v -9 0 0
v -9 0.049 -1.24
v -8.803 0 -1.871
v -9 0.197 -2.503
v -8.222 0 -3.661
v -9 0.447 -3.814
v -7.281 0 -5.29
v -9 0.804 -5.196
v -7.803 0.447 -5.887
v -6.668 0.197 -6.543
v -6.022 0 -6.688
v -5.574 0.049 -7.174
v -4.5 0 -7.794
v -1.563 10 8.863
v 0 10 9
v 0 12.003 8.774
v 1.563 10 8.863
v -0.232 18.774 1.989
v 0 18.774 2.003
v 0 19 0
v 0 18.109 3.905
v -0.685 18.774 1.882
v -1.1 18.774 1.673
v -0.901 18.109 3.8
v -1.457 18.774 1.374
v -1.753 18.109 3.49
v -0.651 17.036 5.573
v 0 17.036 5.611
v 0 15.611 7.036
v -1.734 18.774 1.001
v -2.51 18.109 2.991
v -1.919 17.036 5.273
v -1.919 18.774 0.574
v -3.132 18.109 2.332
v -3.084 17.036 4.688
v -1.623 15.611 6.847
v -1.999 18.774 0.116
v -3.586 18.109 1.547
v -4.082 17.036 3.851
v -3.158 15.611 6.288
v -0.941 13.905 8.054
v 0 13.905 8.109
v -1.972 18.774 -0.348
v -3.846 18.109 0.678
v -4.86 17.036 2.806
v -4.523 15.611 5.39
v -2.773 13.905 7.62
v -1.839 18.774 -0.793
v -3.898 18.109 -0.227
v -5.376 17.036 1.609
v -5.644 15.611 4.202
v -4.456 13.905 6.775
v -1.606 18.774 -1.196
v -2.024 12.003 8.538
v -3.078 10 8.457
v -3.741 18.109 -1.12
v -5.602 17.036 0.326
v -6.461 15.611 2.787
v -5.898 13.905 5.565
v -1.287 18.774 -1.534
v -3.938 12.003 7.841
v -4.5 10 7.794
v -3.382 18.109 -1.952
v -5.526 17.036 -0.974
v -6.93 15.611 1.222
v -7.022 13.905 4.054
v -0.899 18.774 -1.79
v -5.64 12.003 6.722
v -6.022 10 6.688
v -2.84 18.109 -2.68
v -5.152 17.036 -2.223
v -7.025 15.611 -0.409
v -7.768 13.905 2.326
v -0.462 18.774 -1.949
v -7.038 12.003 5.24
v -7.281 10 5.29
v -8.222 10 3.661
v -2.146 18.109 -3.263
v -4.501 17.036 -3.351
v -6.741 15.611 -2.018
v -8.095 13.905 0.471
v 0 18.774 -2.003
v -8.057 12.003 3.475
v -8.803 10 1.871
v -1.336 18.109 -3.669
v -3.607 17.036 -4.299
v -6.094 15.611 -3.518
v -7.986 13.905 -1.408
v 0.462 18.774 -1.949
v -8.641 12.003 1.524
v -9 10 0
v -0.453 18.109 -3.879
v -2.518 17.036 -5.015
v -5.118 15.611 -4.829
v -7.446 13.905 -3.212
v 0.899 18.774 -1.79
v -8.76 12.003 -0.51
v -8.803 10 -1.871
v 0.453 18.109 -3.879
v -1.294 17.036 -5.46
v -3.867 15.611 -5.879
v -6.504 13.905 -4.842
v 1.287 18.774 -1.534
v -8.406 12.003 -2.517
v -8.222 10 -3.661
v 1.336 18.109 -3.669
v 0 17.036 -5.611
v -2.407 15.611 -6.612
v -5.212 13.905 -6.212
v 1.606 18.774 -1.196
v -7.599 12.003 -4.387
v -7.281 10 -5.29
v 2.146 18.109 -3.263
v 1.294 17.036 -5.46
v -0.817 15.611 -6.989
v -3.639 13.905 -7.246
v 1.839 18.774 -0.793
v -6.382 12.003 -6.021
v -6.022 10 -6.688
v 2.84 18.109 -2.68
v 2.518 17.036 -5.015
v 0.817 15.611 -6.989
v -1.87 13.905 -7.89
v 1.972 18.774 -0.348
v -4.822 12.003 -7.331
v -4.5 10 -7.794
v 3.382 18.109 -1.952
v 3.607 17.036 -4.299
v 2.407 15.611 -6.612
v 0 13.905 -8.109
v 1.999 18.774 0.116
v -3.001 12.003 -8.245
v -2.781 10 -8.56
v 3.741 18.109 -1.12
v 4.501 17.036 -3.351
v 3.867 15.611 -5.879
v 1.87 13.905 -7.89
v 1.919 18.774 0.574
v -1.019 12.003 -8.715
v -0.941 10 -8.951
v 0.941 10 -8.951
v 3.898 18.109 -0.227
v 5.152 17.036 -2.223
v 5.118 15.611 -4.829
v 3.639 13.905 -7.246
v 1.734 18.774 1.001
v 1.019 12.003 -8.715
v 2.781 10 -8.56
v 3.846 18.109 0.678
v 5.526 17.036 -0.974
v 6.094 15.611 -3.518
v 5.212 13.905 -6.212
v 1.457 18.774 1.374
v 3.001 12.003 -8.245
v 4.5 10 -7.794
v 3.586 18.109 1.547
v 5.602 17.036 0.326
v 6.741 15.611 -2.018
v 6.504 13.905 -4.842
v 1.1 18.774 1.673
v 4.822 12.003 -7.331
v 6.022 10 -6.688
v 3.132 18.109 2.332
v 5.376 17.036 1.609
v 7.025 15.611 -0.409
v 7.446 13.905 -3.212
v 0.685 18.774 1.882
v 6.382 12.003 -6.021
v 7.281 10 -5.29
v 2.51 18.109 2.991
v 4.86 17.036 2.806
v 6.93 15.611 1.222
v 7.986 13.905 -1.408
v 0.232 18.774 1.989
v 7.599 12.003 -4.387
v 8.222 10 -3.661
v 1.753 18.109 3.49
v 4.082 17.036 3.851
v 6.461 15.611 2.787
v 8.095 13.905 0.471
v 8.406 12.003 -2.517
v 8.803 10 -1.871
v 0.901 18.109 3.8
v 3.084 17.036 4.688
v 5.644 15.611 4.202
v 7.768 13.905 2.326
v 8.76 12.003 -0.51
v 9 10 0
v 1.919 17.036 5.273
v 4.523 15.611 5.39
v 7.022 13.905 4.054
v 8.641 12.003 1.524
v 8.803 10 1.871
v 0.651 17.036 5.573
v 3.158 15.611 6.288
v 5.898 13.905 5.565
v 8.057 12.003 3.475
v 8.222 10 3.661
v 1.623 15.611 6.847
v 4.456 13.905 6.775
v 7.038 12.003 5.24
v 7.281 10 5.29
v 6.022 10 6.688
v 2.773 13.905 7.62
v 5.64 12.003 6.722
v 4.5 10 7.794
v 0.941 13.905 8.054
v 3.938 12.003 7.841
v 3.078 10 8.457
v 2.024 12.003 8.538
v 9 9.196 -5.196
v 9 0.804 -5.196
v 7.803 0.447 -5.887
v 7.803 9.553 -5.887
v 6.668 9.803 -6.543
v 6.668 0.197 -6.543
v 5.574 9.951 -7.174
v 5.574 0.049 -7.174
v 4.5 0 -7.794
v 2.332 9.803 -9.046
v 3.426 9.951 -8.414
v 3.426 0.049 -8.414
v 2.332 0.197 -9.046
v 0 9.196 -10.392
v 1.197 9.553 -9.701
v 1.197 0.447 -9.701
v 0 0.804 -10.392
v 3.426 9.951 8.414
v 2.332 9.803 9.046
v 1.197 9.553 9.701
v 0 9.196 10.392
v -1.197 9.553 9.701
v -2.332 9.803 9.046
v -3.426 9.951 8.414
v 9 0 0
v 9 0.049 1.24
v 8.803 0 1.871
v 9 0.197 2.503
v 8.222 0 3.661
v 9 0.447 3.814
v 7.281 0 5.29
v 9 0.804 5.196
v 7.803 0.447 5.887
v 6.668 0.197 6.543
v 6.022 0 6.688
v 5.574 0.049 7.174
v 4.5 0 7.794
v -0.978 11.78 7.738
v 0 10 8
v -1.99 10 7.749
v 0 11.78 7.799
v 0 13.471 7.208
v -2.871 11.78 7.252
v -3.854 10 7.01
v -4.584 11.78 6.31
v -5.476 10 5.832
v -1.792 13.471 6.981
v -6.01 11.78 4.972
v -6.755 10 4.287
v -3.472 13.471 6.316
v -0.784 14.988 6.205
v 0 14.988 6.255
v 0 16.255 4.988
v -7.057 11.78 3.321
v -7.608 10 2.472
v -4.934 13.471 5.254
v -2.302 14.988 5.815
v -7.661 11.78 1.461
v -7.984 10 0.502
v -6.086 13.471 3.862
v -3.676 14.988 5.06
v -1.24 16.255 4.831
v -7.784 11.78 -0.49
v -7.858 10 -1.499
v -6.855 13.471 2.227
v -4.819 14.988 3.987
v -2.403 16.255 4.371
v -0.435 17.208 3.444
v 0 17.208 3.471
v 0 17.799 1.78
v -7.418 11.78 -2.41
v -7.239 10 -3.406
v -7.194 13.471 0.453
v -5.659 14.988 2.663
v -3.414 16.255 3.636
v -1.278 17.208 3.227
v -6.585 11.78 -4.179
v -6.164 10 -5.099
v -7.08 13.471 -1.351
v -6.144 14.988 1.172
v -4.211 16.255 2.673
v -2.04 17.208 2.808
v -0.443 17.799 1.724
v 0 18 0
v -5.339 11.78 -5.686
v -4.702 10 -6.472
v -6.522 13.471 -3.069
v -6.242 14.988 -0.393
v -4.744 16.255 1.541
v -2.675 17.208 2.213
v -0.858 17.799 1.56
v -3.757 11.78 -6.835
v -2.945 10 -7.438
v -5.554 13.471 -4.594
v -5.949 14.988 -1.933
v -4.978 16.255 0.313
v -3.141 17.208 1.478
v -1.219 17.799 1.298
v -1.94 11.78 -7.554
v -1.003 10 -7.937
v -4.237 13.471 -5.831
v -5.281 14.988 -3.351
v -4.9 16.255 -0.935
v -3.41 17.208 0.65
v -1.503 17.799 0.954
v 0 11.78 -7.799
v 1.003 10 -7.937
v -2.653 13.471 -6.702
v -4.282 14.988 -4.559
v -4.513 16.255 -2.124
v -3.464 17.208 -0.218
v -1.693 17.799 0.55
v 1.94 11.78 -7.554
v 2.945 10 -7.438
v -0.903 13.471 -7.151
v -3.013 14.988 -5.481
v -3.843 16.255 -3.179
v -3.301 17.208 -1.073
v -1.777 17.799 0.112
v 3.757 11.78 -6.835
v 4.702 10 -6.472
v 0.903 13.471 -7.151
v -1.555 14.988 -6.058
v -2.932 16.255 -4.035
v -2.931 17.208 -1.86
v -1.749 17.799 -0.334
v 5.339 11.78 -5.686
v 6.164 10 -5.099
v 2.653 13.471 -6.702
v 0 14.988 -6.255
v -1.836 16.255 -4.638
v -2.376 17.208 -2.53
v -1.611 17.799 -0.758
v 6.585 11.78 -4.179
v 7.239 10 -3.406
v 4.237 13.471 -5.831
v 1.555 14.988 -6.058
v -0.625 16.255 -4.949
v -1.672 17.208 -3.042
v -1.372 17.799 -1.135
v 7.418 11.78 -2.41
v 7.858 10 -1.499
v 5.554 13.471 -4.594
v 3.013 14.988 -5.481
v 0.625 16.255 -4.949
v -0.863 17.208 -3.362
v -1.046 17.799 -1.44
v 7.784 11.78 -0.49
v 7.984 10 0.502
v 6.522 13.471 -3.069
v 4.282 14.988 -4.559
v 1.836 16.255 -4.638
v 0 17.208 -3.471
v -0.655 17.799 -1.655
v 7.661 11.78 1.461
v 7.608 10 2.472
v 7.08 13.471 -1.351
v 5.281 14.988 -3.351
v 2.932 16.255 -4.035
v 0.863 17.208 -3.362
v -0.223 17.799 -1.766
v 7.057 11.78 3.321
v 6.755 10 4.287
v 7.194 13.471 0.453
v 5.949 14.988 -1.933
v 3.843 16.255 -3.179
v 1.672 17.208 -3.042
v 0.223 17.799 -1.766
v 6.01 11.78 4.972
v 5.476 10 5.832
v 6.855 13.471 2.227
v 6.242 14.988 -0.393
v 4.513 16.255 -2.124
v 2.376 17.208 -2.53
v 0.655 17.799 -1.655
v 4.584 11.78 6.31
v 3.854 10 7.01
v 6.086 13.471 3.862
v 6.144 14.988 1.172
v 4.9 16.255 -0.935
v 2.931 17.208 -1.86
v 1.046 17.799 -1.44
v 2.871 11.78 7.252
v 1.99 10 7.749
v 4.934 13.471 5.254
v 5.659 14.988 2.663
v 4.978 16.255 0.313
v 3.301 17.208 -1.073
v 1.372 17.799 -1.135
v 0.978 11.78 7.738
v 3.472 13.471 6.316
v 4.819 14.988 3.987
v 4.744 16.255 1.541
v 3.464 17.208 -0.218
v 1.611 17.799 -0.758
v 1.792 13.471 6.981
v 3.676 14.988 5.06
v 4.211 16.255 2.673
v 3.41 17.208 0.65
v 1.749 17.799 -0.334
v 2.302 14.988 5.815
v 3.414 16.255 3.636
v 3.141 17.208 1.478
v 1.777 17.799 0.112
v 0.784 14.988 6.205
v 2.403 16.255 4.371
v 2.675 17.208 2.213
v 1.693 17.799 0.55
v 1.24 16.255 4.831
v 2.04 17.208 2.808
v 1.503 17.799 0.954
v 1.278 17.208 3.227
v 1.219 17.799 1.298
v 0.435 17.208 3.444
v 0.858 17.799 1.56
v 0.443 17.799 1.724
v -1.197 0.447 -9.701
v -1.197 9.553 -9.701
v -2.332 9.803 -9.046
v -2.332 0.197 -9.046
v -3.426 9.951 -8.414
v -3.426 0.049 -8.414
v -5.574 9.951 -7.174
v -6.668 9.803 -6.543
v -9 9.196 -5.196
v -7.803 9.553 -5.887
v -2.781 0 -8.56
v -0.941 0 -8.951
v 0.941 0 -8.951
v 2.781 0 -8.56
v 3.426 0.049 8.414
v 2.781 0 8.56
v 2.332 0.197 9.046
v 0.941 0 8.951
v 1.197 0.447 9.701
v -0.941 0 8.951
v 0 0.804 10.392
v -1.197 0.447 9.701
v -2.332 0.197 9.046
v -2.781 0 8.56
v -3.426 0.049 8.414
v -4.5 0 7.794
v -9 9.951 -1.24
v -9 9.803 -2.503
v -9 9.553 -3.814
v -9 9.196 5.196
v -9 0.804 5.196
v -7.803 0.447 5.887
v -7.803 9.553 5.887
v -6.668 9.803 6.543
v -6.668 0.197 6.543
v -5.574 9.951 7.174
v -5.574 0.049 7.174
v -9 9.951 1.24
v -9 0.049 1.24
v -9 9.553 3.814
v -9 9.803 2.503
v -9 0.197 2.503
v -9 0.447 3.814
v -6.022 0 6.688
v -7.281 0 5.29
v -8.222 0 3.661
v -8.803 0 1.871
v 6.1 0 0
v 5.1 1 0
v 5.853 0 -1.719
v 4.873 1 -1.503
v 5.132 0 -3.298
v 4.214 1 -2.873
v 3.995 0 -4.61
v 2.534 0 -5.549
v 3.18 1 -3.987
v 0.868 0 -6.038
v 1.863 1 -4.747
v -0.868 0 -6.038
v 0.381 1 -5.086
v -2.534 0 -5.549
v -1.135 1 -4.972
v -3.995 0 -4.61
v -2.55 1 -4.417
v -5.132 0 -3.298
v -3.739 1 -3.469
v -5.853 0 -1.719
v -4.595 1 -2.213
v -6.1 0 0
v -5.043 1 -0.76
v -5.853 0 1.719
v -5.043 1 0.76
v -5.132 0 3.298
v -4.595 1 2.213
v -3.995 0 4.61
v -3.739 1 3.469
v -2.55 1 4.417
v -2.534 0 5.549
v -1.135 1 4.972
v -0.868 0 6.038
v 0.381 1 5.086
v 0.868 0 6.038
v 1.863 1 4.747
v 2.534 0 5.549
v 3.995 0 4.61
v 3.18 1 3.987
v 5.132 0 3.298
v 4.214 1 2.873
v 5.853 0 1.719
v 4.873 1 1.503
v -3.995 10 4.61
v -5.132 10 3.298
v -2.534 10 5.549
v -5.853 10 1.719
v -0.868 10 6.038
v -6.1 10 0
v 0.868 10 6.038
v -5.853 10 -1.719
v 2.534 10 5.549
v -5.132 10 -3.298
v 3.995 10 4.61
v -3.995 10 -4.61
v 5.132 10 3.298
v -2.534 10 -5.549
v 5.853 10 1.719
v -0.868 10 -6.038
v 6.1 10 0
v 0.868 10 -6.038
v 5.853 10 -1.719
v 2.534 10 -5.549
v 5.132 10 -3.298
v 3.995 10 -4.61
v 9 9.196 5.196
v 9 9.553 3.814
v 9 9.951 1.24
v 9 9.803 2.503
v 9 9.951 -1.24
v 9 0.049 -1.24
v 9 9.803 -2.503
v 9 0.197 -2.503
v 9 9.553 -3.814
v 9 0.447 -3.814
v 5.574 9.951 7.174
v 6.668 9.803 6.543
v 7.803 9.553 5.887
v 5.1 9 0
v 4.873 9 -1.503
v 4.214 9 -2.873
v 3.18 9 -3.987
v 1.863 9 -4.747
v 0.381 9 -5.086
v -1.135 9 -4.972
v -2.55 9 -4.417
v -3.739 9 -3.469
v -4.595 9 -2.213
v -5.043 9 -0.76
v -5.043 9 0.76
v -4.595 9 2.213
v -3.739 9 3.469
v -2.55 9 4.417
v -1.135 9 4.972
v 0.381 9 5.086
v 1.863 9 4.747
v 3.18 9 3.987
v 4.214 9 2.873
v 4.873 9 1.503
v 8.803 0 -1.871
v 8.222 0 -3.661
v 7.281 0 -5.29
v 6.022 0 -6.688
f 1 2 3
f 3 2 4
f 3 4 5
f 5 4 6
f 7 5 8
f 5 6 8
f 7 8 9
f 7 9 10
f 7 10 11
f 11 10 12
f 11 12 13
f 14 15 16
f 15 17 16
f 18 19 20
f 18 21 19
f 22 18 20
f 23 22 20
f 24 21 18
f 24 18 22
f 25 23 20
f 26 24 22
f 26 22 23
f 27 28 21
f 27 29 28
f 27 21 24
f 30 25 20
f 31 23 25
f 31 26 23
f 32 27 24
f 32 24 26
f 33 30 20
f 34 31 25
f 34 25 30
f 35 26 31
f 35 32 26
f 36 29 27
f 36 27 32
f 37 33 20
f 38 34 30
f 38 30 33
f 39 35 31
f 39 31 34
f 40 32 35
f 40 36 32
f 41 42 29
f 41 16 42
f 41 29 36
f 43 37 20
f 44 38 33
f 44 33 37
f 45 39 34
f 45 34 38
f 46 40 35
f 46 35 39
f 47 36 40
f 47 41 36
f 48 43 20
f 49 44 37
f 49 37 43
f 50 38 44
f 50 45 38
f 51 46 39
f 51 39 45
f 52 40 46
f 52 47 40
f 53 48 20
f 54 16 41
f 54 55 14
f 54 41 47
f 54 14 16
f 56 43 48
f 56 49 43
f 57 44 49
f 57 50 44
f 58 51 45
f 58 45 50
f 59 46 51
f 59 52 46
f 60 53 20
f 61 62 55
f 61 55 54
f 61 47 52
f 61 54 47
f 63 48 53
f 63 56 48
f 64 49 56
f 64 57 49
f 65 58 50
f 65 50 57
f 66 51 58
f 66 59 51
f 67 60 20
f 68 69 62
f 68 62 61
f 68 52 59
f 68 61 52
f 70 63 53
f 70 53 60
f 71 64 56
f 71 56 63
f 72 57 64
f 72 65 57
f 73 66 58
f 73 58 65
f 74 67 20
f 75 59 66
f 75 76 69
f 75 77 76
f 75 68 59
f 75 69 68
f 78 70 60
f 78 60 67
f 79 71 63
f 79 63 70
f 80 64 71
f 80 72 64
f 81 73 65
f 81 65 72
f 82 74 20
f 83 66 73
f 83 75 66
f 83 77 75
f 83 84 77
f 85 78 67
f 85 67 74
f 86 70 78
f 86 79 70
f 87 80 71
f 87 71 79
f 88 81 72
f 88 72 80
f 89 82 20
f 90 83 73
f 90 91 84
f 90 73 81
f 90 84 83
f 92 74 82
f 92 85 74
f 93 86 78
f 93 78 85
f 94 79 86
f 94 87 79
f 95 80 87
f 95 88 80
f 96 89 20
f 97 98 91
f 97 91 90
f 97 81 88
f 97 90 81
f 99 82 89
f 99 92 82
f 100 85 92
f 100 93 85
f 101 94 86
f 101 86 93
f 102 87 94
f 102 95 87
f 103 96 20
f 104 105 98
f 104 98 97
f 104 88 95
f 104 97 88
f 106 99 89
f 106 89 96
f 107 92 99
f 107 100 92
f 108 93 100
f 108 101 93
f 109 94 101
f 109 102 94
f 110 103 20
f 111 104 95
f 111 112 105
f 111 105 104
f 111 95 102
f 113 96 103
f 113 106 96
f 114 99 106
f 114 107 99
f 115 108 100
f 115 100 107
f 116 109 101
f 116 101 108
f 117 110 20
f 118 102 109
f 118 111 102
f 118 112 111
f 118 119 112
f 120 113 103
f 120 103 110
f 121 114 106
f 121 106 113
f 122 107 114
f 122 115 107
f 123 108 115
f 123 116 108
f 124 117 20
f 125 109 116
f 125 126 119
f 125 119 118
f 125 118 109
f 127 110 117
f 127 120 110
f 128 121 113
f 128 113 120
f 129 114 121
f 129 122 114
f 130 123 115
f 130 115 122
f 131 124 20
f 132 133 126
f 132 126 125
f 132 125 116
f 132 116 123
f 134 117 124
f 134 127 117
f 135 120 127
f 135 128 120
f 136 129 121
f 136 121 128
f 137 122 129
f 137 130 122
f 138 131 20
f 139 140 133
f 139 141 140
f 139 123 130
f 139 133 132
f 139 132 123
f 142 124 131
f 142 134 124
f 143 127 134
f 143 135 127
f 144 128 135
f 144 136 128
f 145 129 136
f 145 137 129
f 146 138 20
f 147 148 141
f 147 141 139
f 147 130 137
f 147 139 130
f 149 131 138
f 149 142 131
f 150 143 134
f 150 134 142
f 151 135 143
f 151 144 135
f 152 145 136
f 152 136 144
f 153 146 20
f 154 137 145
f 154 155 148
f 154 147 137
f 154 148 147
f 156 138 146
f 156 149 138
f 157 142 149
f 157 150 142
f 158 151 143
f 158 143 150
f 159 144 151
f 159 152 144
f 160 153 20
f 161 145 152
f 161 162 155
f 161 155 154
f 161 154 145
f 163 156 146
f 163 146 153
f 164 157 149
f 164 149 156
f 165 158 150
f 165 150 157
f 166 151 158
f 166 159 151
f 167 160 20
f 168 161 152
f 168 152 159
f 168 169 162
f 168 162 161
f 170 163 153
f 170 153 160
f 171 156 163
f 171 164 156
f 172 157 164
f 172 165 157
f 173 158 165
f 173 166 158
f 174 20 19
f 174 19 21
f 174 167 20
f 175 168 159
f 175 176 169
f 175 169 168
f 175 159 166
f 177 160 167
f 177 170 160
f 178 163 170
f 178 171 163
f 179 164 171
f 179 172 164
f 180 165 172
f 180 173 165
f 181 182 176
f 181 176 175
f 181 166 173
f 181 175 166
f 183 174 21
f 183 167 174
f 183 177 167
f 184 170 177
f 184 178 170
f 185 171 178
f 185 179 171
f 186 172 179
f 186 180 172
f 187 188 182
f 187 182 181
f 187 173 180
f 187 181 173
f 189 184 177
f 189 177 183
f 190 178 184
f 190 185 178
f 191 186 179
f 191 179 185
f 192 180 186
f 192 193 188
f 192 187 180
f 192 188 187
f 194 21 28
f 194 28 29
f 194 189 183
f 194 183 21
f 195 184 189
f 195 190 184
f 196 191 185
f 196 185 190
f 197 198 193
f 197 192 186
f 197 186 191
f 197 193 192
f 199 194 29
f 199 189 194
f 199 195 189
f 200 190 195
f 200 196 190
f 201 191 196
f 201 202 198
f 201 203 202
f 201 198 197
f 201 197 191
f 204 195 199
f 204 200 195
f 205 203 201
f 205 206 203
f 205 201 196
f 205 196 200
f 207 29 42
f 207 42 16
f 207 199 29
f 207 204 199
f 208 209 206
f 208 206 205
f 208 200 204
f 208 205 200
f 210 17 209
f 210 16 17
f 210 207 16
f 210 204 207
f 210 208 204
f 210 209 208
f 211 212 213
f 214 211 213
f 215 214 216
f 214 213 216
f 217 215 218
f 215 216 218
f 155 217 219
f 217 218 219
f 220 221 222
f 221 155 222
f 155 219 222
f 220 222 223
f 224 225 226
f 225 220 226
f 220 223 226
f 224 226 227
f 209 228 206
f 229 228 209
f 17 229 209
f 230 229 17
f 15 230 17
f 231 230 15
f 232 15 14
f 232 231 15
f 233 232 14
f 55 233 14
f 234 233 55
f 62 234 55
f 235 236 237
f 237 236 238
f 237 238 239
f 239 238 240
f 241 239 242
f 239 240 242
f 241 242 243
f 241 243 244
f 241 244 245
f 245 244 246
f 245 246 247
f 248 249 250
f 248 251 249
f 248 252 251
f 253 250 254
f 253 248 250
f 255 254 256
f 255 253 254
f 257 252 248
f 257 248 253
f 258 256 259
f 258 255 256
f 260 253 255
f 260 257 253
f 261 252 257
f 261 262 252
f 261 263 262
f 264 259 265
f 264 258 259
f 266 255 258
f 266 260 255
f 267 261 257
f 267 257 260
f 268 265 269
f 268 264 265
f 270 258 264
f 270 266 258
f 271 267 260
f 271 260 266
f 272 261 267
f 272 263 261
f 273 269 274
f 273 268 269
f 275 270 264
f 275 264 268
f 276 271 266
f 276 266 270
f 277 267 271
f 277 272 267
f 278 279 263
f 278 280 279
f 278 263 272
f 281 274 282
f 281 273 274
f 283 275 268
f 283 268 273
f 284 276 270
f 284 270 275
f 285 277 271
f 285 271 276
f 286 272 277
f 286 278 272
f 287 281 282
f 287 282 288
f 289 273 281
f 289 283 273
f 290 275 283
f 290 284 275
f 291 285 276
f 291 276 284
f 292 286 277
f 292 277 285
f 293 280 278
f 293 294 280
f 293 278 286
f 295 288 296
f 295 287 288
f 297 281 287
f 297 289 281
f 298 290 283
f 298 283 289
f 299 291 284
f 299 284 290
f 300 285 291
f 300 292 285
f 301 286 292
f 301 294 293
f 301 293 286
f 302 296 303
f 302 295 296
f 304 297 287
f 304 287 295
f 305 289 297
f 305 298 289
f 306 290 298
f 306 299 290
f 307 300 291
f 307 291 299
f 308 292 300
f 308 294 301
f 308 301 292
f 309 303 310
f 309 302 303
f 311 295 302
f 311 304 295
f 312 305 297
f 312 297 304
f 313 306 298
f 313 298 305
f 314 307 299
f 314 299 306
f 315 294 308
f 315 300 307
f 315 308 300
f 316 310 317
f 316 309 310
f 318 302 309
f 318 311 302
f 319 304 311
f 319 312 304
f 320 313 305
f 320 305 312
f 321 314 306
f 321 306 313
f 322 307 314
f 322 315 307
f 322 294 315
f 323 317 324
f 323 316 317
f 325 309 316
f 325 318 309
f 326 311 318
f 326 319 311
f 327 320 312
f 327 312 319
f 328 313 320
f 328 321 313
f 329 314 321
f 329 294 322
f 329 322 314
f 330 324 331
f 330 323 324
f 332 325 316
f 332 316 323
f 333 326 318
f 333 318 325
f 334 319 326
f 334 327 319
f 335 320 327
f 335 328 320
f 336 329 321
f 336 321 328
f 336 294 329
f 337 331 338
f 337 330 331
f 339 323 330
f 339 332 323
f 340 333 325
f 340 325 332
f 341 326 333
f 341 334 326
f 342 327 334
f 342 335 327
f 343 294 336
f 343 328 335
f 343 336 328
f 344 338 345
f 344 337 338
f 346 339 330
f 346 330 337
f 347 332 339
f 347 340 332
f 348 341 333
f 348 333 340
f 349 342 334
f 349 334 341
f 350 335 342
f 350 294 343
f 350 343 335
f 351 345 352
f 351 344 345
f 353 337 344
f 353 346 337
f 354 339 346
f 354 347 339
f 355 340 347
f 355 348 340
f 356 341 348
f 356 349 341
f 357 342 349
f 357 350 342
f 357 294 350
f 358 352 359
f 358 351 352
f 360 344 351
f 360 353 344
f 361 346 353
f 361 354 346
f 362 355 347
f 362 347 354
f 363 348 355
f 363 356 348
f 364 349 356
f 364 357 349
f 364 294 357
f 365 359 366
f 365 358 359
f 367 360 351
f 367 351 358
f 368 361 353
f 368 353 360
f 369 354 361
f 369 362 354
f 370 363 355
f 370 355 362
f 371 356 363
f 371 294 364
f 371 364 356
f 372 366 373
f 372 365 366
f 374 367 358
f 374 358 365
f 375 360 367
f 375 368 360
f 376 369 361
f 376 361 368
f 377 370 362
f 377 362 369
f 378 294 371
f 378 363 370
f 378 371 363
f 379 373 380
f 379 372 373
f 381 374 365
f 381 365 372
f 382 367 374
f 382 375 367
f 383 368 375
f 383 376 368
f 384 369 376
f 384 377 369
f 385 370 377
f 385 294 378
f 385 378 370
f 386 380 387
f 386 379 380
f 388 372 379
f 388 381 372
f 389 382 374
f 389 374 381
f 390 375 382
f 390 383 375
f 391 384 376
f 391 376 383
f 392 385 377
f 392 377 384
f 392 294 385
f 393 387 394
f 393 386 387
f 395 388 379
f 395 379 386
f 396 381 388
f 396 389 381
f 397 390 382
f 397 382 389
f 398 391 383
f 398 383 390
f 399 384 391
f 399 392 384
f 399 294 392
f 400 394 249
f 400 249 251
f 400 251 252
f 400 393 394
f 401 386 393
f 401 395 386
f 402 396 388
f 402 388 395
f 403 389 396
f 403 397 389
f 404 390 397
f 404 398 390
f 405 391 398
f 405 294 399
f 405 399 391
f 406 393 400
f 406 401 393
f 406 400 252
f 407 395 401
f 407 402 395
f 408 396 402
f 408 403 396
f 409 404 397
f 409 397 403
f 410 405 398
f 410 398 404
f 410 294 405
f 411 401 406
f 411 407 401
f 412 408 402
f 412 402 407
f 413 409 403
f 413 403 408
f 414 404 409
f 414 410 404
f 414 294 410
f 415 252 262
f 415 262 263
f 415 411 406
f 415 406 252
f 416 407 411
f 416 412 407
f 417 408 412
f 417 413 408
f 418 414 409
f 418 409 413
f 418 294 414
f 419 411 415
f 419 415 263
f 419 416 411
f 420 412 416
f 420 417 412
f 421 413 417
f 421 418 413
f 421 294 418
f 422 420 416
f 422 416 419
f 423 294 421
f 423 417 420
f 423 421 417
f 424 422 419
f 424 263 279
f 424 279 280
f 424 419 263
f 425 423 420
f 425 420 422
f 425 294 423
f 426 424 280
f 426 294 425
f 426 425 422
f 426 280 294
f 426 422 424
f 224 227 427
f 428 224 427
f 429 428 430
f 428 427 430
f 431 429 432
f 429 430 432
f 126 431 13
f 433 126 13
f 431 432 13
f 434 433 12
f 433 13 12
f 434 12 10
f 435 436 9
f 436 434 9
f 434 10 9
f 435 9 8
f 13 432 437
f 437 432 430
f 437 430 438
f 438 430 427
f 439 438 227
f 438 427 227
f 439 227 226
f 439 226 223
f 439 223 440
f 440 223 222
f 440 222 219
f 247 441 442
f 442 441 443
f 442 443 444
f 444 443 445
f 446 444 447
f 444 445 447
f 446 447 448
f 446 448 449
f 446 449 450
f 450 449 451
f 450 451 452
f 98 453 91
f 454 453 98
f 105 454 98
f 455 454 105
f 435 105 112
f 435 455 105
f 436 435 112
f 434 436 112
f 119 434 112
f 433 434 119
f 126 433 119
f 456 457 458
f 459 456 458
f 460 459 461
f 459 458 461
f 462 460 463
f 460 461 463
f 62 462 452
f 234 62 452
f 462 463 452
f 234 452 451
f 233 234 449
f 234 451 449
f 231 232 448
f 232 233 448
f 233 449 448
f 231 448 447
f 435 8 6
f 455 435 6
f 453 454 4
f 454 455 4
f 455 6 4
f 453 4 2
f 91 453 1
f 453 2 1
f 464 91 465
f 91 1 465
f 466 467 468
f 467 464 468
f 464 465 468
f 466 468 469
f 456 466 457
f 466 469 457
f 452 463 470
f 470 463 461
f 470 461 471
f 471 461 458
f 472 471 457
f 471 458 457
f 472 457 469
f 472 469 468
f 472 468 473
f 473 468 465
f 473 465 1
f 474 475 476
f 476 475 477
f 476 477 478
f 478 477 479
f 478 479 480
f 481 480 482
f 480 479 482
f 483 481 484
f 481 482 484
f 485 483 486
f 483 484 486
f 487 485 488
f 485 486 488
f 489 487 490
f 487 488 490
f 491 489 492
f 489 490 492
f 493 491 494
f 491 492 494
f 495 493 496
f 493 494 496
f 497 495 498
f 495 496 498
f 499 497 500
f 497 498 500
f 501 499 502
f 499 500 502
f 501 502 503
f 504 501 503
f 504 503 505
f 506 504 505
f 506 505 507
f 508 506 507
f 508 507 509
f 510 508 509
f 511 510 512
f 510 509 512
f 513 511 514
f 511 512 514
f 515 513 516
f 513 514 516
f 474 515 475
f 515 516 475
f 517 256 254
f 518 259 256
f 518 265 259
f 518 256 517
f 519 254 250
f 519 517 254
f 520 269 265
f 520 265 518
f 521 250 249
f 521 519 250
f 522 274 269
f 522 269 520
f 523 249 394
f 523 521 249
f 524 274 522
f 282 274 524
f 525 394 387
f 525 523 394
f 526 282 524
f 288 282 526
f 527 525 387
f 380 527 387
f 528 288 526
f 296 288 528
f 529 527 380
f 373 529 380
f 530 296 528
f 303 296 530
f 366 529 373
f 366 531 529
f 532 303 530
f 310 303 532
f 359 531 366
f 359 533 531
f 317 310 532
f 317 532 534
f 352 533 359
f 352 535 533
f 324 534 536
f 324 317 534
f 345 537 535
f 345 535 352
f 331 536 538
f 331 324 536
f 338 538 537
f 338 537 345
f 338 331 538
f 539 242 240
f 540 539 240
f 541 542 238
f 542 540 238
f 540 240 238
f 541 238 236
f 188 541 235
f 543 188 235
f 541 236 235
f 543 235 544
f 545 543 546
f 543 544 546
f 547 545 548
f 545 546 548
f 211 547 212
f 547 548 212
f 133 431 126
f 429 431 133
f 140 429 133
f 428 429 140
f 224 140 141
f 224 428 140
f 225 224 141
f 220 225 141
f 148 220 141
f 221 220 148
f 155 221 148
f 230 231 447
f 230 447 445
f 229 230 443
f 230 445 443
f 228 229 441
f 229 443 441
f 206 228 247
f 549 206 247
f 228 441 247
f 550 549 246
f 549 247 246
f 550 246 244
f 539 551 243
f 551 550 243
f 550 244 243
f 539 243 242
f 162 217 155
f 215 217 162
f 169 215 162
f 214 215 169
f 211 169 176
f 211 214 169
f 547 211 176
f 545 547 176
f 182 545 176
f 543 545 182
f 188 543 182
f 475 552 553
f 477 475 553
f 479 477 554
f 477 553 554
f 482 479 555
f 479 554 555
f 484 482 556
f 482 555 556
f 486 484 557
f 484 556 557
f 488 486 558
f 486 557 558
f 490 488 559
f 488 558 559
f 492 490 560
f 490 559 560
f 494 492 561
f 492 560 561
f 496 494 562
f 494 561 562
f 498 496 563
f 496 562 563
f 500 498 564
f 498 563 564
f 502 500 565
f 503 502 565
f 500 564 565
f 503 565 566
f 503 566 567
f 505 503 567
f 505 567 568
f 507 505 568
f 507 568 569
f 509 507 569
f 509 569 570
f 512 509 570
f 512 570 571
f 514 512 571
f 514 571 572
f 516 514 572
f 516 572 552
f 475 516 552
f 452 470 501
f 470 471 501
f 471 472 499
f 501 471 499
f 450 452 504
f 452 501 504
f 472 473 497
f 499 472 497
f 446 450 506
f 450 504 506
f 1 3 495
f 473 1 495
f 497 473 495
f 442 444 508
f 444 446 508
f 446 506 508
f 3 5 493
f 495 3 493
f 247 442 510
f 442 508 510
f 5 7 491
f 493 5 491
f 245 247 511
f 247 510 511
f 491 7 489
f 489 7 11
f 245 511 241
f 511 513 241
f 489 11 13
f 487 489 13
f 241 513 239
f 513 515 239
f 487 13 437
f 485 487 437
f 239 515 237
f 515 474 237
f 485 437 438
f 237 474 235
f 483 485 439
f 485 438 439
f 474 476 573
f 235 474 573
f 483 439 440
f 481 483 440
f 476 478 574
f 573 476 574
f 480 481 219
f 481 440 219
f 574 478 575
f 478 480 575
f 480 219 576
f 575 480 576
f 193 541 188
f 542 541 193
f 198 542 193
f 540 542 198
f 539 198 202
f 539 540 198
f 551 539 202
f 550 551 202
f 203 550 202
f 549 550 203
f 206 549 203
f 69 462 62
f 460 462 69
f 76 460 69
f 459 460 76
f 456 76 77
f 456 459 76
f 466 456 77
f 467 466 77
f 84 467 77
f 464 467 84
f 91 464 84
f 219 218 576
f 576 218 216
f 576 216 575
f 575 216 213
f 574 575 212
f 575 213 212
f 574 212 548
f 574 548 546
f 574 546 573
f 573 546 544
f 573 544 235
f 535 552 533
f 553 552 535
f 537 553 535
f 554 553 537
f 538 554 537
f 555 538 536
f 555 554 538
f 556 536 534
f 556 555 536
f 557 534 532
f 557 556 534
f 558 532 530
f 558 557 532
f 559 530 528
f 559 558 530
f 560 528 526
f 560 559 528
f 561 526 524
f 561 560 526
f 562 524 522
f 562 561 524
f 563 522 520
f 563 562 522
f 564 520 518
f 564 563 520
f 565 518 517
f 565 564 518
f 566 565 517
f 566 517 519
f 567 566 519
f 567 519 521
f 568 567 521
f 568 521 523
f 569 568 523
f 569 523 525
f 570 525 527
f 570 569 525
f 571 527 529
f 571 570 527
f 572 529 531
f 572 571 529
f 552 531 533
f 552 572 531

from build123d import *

# Parameters (mm, degrees)
EXTRUDE_1_DEPTH     = 10
HOLE_WIZARD_M12_1_D = 10.2
CHAMFER_2_SIZE      = 1


with BuildPart() as part:
    # 草图1 → 凸台-拉伸1 (new body)
    with BuildSketch(Plane(origin=(0, 0, 0), x_dir=(1, 0, 0), z_dir=(0, 1, 0))):
        Polygon((9, -5.196152423), (9, 5.196152423), (0, 10.392304845), (-9, 5.196152423), (-9, -5.196152423), (0, -10.392304845), align=None)
    extrude(amount=EXTRUDE_1_DEPTH)

    # 草图3 → 切除-旋转1 (revolve, cut)
    with BuildSketch(Plane(origin=(0, 0, 0), x_dir=(0, 0, -1), z_dir=(1, 0, 0))):
        Polygon((9, 10), (10.392304845, 9.196152423), (10.392304845, 10), align=None)
    cut_revolve_1 = revolve(axis=Axis((0, 12.408393564, 0), (0, -1, 0)), mode=Mode.SUBTRACT)

    # 镜向1: 切除-旋转1 across plane
    add(cut_revolve_1.mirror(Plane.ZX.offset(5)), mode=Mode.SUBTRACT)

    # M12 螺纹孔1 (through all)
    with Locations(Plane(origin=(0, 0, 0), x_dir=(-1, 0, 0), z_dir=(0, -1, 0))):
        with Locations((0, 0)):
            Hole(HOLE_WIZARD_M12_1_D / 2)

    # 倒角2
    chamfer_2_edges = [part.edges().sort_by_distance(p)[0] for p in [
        (-5.1, 0, 0),
        (-5.1, 10, 0),
    ]]
    chamfer(chamfer_2_edges, length=CHAMFER_2_SIZE)

    # 草图9 → 旋转-薄壁1 (revolve)
    with BuildSketch(Plane(origin=(0, 0, 0), x_dir=(0, 0, -1), z_dir=(1, 0, 0)), mode=Mode.PRIVATE) as revolve_1_sk:
        with BuildLine():
            ThreePointArc((0, 19), (6.363961031, 16.363961031), (9, 10))
            Line((9, 10), (8, 10))
            ThreePointArc((8, 10), (5.656854249, 15.656854249), (0, 18))
            Line((0, 18), (0, 19))
        make_face()
    revolve(revolve_1_sk.sketch.rotate(Axis((0, 21.479292142, 0), (0, -1, 0)), 180), axis=Axis((0, 21.479292142, 0), (0, -1, 0)))


solid = part.part
